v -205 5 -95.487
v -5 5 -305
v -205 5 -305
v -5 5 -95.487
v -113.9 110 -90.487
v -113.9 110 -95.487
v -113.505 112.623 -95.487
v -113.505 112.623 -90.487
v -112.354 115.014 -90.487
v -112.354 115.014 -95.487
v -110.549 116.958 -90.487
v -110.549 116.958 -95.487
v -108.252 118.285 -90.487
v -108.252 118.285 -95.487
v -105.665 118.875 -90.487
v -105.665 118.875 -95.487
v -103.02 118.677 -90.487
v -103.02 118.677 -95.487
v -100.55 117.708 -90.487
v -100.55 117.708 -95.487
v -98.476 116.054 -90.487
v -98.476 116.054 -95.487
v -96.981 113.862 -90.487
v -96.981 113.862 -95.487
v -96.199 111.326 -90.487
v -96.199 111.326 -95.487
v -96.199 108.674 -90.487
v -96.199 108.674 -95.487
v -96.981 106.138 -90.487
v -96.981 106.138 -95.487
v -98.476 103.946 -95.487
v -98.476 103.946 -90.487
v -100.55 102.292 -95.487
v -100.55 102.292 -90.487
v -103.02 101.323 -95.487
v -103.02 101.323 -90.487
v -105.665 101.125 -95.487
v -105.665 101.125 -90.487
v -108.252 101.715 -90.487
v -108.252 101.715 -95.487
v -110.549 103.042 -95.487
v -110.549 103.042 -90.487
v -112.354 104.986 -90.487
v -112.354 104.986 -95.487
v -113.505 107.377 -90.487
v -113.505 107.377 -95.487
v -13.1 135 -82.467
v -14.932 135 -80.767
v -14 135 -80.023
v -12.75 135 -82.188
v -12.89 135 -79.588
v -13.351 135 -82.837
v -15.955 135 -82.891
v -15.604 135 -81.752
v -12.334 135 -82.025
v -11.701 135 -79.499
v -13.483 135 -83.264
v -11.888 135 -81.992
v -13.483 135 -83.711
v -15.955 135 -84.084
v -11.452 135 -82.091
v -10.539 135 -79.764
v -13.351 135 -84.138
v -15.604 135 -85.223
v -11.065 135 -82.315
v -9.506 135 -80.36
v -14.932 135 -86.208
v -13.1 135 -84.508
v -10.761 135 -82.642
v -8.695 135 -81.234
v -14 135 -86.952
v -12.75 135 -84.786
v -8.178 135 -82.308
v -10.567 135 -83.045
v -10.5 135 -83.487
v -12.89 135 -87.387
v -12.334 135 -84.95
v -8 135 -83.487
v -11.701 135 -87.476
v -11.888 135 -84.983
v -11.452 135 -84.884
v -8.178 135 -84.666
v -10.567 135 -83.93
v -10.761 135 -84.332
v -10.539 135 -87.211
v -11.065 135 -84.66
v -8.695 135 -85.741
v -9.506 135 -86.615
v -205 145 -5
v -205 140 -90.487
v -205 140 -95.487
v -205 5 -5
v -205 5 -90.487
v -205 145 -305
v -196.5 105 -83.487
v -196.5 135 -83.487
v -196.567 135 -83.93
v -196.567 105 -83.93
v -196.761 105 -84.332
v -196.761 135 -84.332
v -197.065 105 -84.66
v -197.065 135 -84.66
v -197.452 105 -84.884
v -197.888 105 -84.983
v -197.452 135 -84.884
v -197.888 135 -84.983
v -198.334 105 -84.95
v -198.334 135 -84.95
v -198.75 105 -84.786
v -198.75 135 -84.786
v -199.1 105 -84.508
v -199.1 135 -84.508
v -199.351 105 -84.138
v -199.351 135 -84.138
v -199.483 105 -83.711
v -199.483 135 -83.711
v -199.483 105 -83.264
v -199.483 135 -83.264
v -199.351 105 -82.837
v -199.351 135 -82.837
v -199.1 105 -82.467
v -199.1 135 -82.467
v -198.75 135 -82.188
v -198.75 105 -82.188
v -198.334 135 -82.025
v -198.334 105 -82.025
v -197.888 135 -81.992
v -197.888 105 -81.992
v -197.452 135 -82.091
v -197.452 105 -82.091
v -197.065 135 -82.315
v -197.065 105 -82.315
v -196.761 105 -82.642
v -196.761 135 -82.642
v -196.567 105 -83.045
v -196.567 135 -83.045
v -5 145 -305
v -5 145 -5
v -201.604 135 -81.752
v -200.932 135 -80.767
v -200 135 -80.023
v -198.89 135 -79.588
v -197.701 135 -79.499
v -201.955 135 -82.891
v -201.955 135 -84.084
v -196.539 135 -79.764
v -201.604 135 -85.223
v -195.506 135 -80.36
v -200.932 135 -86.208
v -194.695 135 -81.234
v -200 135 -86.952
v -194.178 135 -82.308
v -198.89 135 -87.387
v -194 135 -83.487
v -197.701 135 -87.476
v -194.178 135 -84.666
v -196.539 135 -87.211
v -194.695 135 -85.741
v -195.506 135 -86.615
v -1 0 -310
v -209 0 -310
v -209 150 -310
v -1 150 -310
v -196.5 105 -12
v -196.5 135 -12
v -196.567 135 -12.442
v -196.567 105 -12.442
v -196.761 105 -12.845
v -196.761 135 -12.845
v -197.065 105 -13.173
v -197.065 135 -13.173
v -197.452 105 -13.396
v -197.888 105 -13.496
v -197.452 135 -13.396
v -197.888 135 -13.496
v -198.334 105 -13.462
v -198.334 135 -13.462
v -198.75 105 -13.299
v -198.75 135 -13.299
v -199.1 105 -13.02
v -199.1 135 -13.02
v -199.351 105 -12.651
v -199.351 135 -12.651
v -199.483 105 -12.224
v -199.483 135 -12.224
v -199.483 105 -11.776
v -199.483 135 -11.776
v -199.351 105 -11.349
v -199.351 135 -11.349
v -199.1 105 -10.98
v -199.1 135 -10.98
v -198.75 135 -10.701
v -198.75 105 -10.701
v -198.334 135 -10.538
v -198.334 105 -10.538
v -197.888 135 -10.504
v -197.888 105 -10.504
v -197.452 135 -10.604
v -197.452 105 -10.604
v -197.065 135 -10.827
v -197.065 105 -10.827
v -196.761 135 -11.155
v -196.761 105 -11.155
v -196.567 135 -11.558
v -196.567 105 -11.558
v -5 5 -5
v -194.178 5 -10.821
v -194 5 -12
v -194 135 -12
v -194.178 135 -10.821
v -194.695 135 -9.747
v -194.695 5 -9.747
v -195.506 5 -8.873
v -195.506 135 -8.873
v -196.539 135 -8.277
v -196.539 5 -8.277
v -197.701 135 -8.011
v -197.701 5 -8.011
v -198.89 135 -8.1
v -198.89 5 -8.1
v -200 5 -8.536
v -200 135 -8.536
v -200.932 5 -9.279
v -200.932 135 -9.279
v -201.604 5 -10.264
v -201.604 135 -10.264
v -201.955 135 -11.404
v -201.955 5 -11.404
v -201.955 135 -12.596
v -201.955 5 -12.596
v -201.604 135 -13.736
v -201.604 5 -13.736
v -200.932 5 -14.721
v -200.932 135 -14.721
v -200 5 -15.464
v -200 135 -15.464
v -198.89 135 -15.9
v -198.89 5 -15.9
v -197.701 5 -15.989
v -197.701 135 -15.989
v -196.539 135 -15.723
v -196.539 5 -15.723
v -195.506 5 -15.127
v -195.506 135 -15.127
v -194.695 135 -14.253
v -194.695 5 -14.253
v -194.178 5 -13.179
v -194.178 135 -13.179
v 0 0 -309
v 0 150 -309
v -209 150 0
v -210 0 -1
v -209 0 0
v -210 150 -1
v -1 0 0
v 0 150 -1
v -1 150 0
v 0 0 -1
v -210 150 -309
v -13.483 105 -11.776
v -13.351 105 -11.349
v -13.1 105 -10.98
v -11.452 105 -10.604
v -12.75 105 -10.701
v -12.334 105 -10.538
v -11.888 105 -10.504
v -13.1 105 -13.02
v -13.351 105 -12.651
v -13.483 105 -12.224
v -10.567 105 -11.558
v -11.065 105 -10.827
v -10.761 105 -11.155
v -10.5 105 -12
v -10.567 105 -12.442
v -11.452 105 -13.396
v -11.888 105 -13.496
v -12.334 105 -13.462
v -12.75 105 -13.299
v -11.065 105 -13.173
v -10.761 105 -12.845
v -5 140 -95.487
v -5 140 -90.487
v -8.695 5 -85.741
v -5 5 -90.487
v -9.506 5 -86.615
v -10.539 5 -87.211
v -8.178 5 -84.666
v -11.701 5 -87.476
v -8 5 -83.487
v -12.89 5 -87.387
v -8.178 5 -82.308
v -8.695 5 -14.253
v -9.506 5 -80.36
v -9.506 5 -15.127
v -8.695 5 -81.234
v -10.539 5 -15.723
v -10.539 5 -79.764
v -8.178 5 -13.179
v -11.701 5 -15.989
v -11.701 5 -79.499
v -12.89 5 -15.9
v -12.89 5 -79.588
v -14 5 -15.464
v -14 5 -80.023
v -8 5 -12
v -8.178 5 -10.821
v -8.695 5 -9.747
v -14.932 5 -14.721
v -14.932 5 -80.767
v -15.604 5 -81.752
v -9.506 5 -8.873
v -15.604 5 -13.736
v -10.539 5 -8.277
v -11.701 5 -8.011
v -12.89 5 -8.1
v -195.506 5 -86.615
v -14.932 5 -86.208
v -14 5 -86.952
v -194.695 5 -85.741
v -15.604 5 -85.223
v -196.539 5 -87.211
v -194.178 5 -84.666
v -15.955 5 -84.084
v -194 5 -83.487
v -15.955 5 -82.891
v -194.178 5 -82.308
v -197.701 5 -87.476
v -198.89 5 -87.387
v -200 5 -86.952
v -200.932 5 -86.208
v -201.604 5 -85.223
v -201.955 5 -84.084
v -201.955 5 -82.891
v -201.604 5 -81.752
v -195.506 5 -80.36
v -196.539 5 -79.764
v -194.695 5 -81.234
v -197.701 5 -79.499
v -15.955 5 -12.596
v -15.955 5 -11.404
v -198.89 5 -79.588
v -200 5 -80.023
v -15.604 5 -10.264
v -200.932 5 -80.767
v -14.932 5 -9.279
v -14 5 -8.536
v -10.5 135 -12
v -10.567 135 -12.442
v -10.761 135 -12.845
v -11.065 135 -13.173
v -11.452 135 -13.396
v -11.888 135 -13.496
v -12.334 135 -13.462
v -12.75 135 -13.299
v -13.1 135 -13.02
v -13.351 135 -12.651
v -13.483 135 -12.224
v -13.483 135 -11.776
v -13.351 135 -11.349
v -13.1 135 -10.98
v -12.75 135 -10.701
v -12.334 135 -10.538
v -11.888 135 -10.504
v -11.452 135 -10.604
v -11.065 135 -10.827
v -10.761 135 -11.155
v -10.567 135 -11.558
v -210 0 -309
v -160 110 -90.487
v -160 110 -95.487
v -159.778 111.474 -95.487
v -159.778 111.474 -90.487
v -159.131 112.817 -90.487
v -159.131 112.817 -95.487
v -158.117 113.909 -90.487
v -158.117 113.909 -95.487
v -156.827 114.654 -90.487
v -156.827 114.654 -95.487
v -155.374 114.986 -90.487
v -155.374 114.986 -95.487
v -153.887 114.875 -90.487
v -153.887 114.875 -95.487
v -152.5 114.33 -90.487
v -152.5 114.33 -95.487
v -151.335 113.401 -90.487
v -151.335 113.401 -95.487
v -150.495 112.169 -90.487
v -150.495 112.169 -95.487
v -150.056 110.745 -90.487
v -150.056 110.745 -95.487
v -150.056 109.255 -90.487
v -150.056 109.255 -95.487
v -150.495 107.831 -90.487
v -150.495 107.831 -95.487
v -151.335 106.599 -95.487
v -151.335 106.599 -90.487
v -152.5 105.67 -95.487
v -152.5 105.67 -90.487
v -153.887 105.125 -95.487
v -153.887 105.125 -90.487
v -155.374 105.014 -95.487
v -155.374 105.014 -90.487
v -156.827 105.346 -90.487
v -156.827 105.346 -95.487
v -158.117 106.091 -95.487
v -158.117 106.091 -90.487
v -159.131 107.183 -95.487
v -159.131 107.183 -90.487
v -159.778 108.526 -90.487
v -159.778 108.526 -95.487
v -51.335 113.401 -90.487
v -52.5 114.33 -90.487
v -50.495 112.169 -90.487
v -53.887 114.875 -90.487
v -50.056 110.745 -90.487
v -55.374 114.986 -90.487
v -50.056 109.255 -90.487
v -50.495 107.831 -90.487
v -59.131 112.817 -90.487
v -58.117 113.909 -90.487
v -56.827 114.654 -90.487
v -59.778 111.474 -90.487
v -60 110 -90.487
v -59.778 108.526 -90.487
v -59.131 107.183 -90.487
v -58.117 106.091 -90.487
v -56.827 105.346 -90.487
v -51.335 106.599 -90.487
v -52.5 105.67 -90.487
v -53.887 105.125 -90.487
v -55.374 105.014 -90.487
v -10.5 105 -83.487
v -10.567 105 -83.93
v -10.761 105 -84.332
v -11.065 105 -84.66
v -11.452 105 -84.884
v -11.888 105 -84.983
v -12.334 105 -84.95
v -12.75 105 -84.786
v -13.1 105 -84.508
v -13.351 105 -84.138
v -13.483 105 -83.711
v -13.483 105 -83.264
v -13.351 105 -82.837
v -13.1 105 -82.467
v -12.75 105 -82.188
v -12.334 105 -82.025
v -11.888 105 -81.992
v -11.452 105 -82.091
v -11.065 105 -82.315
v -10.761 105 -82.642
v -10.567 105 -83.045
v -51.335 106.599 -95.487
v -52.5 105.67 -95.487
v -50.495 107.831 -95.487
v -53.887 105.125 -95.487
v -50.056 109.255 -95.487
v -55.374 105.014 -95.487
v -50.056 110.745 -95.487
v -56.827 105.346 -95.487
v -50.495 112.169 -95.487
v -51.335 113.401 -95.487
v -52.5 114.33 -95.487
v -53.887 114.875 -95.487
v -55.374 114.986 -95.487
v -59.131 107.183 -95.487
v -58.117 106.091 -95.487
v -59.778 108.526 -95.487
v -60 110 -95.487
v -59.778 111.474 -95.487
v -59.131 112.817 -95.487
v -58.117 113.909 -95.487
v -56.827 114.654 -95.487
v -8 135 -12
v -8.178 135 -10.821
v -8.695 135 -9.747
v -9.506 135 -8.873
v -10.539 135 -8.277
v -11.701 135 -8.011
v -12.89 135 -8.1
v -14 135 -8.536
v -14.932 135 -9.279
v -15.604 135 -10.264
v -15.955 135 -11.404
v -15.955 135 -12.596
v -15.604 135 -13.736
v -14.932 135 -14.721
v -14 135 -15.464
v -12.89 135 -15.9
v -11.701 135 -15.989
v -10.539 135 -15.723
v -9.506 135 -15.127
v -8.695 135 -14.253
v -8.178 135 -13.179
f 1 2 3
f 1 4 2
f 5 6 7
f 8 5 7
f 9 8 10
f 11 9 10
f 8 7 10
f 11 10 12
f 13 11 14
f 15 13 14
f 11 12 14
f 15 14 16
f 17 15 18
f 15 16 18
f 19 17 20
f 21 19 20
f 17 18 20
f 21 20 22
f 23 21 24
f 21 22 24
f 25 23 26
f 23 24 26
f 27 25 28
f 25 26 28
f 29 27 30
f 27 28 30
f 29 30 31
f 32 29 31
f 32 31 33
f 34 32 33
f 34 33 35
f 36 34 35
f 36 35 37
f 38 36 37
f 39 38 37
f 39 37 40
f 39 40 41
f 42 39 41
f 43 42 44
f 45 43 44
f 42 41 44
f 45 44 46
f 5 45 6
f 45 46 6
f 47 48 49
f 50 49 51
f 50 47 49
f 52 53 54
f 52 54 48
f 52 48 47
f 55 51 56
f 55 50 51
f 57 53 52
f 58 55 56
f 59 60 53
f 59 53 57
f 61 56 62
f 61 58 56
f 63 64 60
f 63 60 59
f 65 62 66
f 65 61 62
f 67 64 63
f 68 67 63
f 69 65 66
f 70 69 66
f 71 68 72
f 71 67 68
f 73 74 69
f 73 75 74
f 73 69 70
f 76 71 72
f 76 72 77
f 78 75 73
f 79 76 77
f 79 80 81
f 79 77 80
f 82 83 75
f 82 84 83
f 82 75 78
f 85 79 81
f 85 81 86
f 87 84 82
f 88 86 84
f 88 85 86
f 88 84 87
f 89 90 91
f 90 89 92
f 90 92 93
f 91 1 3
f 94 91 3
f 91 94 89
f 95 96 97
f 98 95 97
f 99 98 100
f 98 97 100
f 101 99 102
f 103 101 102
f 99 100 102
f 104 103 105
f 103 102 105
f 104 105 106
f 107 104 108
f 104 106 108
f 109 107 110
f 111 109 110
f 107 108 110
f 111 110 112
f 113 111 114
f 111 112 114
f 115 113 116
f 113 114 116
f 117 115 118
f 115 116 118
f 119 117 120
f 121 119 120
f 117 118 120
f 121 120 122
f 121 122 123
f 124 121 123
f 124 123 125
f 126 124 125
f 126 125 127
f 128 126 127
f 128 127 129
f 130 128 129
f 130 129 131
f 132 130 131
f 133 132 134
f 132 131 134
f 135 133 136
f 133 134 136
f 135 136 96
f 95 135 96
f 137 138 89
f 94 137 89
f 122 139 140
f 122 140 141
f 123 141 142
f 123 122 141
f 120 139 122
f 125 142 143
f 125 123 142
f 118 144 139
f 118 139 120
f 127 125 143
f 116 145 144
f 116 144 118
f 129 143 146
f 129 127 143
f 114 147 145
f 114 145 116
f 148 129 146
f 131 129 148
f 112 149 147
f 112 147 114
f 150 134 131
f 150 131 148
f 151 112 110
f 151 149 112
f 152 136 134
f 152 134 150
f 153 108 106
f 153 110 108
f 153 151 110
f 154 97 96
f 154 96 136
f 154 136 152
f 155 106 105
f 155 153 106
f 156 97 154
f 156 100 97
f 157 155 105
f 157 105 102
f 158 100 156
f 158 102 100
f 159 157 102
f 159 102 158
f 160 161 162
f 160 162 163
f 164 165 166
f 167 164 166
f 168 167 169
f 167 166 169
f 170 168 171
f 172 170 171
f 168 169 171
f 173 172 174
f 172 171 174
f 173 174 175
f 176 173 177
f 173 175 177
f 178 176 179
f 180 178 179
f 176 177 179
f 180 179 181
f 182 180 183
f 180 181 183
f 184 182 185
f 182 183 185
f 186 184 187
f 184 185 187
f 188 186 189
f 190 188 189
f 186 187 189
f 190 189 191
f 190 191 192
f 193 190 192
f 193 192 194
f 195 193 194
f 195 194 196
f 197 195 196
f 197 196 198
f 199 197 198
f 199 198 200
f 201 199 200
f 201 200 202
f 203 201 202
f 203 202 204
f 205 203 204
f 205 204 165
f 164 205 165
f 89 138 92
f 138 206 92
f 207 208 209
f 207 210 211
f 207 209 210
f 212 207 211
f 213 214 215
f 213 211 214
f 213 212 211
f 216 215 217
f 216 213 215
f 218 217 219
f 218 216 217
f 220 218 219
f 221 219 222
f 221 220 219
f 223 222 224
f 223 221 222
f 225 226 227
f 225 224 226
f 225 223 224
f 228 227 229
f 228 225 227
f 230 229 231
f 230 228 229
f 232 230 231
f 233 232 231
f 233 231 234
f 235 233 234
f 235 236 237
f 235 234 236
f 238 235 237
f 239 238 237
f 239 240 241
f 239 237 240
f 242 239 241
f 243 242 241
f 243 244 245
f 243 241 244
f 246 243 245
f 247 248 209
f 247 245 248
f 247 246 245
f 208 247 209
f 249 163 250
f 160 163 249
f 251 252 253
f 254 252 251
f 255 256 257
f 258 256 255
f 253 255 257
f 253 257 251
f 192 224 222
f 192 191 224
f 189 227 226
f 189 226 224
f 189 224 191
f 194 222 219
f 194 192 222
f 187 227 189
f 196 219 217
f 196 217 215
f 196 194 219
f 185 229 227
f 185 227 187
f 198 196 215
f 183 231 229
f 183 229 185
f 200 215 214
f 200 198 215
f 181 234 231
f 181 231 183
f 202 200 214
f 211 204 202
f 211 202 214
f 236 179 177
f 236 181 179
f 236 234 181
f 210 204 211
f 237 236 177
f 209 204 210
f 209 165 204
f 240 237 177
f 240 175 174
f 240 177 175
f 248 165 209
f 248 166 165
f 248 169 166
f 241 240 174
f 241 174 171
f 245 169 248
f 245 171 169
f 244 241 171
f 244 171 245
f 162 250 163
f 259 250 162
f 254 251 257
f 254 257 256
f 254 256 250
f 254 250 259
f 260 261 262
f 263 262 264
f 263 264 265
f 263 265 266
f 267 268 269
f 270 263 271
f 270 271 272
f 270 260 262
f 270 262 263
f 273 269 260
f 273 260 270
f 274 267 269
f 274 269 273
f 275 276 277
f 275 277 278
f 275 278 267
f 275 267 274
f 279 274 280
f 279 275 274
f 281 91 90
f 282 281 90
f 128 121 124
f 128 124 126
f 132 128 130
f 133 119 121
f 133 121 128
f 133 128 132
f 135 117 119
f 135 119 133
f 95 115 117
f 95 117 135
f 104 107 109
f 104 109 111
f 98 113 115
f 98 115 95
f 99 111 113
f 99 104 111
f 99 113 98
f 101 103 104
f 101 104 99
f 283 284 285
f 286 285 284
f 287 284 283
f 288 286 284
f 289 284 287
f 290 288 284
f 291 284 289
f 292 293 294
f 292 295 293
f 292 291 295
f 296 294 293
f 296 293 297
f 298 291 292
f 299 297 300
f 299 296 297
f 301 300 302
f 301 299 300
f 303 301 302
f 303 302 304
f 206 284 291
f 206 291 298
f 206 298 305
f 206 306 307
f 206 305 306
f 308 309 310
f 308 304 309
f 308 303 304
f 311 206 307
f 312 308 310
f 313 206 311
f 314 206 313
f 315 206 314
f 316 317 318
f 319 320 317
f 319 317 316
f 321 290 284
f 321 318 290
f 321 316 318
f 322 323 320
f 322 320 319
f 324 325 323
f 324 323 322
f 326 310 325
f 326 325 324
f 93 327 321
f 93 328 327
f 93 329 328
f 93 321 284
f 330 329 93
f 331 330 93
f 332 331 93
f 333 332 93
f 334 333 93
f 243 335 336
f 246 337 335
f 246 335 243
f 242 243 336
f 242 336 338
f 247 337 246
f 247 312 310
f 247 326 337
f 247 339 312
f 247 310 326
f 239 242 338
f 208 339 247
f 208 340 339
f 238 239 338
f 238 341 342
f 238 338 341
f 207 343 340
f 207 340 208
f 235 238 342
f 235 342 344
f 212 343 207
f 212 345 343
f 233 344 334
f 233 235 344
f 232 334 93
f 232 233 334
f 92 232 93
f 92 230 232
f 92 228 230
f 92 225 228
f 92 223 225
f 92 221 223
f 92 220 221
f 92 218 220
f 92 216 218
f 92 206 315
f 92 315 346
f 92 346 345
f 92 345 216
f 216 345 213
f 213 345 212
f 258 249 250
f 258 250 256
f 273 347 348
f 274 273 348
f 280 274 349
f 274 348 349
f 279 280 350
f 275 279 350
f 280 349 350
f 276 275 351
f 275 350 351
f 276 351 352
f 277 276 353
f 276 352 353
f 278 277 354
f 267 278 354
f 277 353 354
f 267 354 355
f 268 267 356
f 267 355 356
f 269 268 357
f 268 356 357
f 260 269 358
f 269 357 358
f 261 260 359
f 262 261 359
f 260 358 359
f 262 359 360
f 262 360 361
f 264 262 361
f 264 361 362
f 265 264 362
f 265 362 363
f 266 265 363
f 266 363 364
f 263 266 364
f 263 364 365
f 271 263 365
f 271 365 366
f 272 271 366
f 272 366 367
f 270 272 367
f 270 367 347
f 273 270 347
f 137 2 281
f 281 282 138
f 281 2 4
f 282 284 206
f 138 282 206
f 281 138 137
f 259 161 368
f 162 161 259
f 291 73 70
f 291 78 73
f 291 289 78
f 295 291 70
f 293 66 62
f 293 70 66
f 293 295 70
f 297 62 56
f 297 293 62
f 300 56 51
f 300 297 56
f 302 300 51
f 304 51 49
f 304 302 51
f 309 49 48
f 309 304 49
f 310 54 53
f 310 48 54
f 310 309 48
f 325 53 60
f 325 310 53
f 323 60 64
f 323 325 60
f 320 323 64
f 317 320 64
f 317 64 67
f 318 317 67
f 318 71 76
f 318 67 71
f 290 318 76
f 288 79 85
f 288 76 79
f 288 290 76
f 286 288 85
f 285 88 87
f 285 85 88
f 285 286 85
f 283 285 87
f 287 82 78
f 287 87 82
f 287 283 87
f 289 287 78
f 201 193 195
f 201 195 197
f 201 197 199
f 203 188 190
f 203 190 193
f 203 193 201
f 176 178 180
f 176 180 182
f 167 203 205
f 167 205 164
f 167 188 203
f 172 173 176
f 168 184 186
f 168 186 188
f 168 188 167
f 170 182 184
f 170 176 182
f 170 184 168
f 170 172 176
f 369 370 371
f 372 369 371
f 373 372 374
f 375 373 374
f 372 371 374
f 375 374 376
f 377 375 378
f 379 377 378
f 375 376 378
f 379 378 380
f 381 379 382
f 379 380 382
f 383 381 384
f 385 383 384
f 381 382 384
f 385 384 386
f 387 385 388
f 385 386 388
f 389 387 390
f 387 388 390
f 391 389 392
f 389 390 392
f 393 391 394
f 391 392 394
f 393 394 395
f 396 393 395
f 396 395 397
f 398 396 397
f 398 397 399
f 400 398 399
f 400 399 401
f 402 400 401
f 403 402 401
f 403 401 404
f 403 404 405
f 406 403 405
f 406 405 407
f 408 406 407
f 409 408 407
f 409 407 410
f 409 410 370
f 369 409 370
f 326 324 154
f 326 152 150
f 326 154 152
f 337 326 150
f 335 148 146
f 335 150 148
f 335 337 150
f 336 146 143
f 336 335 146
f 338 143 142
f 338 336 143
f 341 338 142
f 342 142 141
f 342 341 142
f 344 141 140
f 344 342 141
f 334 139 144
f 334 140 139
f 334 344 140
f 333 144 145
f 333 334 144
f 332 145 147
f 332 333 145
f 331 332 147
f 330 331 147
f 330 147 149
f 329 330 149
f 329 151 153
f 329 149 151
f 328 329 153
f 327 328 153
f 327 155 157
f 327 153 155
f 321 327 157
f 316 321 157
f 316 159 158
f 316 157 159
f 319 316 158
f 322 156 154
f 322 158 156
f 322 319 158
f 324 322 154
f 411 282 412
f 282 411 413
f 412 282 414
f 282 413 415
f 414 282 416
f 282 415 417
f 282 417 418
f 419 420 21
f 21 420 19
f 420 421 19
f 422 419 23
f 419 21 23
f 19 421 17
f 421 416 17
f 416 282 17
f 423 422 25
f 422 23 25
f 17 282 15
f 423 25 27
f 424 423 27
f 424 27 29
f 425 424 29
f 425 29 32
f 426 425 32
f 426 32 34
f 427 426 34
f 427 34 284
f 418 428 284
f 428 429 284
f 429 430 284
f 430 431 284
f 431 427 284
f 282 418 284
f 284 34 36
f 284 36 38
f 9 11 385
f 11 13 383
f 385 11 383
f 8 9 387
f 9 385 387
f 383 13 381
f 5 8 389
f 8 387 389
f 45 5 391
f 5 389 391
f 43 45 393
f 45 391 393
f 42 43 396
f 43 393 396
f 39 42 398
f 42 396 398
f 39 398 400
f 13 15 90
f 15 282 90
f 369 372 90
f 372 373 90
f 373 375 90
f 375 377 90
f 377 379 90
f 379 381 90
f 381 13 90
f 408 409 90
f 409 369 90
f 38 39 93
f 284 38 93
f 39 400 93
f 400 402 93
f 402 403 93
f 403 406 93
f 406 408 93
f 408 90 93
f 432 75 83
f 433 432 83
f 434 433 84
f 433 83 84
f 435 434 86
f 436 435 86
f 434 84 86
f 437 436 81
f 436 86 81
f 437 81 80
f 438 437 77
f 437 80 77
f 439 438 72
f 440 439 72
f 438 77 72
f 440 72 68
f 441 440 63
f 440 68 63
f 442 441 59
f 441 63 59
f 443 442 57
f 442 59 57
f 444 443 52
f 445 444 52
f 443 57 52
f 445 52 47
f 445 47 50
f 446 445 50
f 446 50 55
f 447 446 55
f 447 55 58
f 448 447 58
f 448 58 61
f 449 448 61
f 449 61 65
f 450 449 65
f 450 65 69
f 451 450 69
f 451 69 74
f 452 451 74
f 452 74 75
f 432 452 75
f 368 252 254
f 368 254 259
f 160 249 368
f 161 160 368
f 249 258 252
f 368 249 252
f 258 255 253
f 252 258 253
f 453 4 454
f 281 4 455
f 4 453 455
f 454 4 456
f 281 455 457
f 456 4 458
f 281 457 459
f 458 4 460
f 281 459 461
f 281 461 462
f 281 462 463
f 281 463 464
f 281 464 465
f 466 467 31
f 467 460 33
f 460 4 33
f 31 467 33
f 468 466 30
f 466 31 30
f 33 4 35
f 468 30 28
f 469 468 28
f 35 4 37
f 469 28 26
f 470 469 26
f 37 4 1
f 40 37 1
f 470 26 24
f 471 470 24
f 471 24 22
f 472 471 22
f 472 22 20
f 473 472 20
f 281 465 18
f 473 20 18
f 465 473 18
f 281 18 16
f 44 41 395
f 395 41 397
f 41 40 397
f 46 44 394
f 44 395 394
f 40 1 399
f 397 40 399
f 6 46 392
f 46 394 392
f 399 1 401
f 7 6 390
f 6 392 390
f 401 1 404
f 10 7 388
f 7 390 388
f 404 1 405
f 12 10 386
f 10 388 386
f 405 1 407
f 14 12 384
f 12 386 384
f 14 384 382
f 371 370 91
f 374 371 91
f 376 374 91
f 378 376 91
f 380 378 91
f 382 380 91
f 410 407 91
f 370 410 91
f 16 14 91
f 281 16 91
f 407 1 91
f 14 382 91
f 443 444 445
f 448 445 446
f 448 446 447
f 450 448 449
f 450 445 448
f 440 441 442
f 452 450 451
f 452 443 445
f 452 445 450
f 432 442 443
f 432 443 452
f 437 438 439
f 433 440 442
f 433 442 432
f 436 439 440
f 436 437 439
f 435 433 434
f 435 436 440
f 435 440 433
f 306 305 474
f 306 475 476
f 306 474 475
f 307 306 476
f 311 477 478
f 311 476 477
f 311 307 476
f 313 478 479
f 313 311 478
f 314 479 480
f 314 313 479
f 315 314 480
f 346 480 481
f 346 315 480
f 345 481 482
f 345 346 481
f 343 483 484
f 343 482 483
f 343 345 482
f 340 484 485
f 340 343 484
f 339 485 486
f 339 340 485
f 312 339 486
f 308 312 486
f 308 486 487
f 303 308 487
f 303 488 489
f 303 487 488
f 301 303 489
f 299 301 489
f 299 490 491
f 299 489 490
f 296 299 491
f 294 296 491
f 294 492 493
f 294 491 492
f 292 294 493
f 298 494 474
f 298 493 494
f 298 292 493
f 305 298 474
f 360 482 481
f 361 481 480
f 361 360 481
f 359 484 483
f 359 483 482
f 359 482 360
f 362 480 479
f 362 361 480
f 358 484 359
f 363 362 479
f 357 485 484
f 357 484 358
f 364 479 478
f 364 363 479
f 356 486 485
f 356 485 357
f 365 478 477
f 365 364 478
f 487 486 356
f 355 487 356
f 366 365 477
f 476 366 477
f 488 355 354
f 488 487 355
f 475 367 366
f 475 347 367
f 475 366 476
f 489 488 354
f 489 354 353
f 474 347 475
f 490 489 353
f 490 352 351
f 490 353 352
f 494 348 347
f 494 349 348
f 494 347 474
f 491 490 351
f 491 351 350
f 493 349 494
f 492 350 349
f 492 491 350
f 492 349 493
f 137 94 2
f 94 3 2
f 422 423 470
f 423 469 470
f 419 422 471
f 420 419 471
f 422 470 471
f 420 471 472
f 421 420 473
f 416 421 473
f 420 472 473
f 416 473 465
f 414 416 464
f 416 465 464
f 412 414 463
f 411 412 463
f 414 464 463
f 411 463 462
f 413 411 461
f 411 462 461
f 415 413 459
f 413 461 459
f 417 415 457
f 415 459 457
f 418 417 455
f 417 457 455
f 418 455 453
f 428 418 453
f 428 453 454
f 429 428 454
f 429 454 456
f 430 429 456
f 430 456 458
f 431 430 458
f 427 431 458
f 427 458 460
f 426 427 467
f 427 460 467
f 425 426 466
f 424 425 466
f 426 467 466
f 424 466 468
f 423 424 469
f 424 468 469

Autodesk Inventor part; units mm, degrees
ref_plane "YZ Plane" through (0, 0, 0) normal (1, 0, 0) x (0, 1, 0)
ref_plane "XZ Plane" through (0, 0, 0) normal (0, 1, 0) x (-1, 0, 0)
ref_plane "XY Plane" through (0, 0, 0) normal (0, 0, 1) x (1, 0, 0)
sketch "Sketch4" plane through (0, 0, 0) normal (0, 1, 0) x (-1, 0, 0)
  line L0 (0, 0) -> (210, 0)
  line L1 (210, 0) -> (210, -310)
  line L2 (210, -310) -> (0, -310)
  line L3 (0, -310) -> (0, 0)
  dimension "d9" = 310
  dimension "d10" = 210
extrude "Extrusion3" add sketch "Sketch4" along normal blind 150
shell "Shell1" thickness 5 removed faces 0
sketch "Sketch5" plane through (-205, 5, -305) normal (1, 0, 0) x (0, 0, -1)
  line L0 (0, 0) -> (-300, 0) projected
  line L1 (-214.5126, 0) -> (-209.5126, 0)
  line L2 (-209.5126, 0) -> (-209.5126, 135)
  line L3 (-209.5126, 135) -> (-214.5126, 135)
  line L4 (-214.5126, 135) -> (-214.5126, 0)
  point P0 (-305, -5)
  point P1 (-209.5126, 0)
  dimension "d18" = 5
  dimension "d19" = 135
extrude "Extrusion4" add sketch "Sketch5" along normal blind 200
sketch "Sketch6" plane through (-205, 5, -95.4874) normal (0, 0, -1) x (-1, 0, 0)
  circle A0 centre (-150, 105) radius 5
  circle A1 centre (-100, 105) radius 8.9
  circle A2 centre (-50, 105) radius 5
  line L0 (0, 135) -> (0, 0) projected
  line L1 (0, 135) -> (-200, 135) projected
  point P0 (-205, -5)
chamfer "Chamfer1" distance 1 angle 45 4 edges at (-210, 75, -310) (0, 75, -310) (0, 75, 0) (-210, 75, 0)
extrude "Extrusion5" cut sketch "Sketch6" against normal blind 10
sketch "Sketch7" plane through (-205, 5, -5) normal (0, 1, 0) x (1, 0, 0)
  circle A0 centre (7, 7) radius 4
  circle A1 centre (7, 78.4874) radius 4
  circle A2 centre (193, 7) radius 4
  circle A3 centre (193, 78.4874) radius 4
  line L0 (0, 0) -> (200, 0) projected
  line L1 (200, 0) -> (200, 85.4874) projected
  line L2 (0, 85.4874) -> (200, 85.4874) projected
  line L3 (0, 85.4874) -> (0, 0) projected
  point P0 (205, -5)
  dimension "d37" = 8
  dimension "d38" = 8
  dimension "d39" = 8
  dimension "d40" = 8
  dimension "d41" = 7
  dimension "d42" = 7
  dimension "d43" = 7
  dimension "d44" = 7
  dimension "d45" = 7
  dimension "d46" = 7
  dimension "d47" = 7
  dimension "d48" = 7
extrude "Extrusion6" add sketch "Sketch7" along normal blind 130 contours A0 | A1 | A2 | A3
sketch "Sketch8" plane through (-198, 135, -12) normal (0, 1, 0) x (1, 0, 0)
  circle A0 centre (0, 0) radius 1.5
  circle A1 centre (0, 71.4874) radius 4 projected
  circle A2 centre (0, 71.4874) radius 1.5
  circle A3 centre (186, 0) radius 4 projected
  circle A4 centre (186, 0) radius 1.5
  circle A5 centre (186, 71.4874) radius 4 projected
  circle A6 centre (186, 71.4874) radius 1.5
  point P0 (198, -12)
  dimension "d51" = 3
  dimension "d52" = 3
  dimension "d53" = 3
  dimension "d54" = 3
extrude "Extrusion7" cut sketch "Sketch8" against normal blind 30 contours A0 | A2 | A4 | A6
equation "\"d9\" = Panjang_outer"
equation "\"d10\" = Lebar_outer"
equation "\"d11\" = Tinggi_Box"
equation "\"d42\" = d41"
equation "\"d43\" = d41"
equation "\"d44\" = d41"
equation "\"d45\" = d41"
equation "\"d46\" = d41"
equation "\"d47\" = d41"
equation "\"d48\" = d41"
equation "\"Lebar_outer\" = 210"
equation "\"Panjang_outer\" = 310"
equation "\"Tinggi_Box\" = 150"
properties part number "Box"
